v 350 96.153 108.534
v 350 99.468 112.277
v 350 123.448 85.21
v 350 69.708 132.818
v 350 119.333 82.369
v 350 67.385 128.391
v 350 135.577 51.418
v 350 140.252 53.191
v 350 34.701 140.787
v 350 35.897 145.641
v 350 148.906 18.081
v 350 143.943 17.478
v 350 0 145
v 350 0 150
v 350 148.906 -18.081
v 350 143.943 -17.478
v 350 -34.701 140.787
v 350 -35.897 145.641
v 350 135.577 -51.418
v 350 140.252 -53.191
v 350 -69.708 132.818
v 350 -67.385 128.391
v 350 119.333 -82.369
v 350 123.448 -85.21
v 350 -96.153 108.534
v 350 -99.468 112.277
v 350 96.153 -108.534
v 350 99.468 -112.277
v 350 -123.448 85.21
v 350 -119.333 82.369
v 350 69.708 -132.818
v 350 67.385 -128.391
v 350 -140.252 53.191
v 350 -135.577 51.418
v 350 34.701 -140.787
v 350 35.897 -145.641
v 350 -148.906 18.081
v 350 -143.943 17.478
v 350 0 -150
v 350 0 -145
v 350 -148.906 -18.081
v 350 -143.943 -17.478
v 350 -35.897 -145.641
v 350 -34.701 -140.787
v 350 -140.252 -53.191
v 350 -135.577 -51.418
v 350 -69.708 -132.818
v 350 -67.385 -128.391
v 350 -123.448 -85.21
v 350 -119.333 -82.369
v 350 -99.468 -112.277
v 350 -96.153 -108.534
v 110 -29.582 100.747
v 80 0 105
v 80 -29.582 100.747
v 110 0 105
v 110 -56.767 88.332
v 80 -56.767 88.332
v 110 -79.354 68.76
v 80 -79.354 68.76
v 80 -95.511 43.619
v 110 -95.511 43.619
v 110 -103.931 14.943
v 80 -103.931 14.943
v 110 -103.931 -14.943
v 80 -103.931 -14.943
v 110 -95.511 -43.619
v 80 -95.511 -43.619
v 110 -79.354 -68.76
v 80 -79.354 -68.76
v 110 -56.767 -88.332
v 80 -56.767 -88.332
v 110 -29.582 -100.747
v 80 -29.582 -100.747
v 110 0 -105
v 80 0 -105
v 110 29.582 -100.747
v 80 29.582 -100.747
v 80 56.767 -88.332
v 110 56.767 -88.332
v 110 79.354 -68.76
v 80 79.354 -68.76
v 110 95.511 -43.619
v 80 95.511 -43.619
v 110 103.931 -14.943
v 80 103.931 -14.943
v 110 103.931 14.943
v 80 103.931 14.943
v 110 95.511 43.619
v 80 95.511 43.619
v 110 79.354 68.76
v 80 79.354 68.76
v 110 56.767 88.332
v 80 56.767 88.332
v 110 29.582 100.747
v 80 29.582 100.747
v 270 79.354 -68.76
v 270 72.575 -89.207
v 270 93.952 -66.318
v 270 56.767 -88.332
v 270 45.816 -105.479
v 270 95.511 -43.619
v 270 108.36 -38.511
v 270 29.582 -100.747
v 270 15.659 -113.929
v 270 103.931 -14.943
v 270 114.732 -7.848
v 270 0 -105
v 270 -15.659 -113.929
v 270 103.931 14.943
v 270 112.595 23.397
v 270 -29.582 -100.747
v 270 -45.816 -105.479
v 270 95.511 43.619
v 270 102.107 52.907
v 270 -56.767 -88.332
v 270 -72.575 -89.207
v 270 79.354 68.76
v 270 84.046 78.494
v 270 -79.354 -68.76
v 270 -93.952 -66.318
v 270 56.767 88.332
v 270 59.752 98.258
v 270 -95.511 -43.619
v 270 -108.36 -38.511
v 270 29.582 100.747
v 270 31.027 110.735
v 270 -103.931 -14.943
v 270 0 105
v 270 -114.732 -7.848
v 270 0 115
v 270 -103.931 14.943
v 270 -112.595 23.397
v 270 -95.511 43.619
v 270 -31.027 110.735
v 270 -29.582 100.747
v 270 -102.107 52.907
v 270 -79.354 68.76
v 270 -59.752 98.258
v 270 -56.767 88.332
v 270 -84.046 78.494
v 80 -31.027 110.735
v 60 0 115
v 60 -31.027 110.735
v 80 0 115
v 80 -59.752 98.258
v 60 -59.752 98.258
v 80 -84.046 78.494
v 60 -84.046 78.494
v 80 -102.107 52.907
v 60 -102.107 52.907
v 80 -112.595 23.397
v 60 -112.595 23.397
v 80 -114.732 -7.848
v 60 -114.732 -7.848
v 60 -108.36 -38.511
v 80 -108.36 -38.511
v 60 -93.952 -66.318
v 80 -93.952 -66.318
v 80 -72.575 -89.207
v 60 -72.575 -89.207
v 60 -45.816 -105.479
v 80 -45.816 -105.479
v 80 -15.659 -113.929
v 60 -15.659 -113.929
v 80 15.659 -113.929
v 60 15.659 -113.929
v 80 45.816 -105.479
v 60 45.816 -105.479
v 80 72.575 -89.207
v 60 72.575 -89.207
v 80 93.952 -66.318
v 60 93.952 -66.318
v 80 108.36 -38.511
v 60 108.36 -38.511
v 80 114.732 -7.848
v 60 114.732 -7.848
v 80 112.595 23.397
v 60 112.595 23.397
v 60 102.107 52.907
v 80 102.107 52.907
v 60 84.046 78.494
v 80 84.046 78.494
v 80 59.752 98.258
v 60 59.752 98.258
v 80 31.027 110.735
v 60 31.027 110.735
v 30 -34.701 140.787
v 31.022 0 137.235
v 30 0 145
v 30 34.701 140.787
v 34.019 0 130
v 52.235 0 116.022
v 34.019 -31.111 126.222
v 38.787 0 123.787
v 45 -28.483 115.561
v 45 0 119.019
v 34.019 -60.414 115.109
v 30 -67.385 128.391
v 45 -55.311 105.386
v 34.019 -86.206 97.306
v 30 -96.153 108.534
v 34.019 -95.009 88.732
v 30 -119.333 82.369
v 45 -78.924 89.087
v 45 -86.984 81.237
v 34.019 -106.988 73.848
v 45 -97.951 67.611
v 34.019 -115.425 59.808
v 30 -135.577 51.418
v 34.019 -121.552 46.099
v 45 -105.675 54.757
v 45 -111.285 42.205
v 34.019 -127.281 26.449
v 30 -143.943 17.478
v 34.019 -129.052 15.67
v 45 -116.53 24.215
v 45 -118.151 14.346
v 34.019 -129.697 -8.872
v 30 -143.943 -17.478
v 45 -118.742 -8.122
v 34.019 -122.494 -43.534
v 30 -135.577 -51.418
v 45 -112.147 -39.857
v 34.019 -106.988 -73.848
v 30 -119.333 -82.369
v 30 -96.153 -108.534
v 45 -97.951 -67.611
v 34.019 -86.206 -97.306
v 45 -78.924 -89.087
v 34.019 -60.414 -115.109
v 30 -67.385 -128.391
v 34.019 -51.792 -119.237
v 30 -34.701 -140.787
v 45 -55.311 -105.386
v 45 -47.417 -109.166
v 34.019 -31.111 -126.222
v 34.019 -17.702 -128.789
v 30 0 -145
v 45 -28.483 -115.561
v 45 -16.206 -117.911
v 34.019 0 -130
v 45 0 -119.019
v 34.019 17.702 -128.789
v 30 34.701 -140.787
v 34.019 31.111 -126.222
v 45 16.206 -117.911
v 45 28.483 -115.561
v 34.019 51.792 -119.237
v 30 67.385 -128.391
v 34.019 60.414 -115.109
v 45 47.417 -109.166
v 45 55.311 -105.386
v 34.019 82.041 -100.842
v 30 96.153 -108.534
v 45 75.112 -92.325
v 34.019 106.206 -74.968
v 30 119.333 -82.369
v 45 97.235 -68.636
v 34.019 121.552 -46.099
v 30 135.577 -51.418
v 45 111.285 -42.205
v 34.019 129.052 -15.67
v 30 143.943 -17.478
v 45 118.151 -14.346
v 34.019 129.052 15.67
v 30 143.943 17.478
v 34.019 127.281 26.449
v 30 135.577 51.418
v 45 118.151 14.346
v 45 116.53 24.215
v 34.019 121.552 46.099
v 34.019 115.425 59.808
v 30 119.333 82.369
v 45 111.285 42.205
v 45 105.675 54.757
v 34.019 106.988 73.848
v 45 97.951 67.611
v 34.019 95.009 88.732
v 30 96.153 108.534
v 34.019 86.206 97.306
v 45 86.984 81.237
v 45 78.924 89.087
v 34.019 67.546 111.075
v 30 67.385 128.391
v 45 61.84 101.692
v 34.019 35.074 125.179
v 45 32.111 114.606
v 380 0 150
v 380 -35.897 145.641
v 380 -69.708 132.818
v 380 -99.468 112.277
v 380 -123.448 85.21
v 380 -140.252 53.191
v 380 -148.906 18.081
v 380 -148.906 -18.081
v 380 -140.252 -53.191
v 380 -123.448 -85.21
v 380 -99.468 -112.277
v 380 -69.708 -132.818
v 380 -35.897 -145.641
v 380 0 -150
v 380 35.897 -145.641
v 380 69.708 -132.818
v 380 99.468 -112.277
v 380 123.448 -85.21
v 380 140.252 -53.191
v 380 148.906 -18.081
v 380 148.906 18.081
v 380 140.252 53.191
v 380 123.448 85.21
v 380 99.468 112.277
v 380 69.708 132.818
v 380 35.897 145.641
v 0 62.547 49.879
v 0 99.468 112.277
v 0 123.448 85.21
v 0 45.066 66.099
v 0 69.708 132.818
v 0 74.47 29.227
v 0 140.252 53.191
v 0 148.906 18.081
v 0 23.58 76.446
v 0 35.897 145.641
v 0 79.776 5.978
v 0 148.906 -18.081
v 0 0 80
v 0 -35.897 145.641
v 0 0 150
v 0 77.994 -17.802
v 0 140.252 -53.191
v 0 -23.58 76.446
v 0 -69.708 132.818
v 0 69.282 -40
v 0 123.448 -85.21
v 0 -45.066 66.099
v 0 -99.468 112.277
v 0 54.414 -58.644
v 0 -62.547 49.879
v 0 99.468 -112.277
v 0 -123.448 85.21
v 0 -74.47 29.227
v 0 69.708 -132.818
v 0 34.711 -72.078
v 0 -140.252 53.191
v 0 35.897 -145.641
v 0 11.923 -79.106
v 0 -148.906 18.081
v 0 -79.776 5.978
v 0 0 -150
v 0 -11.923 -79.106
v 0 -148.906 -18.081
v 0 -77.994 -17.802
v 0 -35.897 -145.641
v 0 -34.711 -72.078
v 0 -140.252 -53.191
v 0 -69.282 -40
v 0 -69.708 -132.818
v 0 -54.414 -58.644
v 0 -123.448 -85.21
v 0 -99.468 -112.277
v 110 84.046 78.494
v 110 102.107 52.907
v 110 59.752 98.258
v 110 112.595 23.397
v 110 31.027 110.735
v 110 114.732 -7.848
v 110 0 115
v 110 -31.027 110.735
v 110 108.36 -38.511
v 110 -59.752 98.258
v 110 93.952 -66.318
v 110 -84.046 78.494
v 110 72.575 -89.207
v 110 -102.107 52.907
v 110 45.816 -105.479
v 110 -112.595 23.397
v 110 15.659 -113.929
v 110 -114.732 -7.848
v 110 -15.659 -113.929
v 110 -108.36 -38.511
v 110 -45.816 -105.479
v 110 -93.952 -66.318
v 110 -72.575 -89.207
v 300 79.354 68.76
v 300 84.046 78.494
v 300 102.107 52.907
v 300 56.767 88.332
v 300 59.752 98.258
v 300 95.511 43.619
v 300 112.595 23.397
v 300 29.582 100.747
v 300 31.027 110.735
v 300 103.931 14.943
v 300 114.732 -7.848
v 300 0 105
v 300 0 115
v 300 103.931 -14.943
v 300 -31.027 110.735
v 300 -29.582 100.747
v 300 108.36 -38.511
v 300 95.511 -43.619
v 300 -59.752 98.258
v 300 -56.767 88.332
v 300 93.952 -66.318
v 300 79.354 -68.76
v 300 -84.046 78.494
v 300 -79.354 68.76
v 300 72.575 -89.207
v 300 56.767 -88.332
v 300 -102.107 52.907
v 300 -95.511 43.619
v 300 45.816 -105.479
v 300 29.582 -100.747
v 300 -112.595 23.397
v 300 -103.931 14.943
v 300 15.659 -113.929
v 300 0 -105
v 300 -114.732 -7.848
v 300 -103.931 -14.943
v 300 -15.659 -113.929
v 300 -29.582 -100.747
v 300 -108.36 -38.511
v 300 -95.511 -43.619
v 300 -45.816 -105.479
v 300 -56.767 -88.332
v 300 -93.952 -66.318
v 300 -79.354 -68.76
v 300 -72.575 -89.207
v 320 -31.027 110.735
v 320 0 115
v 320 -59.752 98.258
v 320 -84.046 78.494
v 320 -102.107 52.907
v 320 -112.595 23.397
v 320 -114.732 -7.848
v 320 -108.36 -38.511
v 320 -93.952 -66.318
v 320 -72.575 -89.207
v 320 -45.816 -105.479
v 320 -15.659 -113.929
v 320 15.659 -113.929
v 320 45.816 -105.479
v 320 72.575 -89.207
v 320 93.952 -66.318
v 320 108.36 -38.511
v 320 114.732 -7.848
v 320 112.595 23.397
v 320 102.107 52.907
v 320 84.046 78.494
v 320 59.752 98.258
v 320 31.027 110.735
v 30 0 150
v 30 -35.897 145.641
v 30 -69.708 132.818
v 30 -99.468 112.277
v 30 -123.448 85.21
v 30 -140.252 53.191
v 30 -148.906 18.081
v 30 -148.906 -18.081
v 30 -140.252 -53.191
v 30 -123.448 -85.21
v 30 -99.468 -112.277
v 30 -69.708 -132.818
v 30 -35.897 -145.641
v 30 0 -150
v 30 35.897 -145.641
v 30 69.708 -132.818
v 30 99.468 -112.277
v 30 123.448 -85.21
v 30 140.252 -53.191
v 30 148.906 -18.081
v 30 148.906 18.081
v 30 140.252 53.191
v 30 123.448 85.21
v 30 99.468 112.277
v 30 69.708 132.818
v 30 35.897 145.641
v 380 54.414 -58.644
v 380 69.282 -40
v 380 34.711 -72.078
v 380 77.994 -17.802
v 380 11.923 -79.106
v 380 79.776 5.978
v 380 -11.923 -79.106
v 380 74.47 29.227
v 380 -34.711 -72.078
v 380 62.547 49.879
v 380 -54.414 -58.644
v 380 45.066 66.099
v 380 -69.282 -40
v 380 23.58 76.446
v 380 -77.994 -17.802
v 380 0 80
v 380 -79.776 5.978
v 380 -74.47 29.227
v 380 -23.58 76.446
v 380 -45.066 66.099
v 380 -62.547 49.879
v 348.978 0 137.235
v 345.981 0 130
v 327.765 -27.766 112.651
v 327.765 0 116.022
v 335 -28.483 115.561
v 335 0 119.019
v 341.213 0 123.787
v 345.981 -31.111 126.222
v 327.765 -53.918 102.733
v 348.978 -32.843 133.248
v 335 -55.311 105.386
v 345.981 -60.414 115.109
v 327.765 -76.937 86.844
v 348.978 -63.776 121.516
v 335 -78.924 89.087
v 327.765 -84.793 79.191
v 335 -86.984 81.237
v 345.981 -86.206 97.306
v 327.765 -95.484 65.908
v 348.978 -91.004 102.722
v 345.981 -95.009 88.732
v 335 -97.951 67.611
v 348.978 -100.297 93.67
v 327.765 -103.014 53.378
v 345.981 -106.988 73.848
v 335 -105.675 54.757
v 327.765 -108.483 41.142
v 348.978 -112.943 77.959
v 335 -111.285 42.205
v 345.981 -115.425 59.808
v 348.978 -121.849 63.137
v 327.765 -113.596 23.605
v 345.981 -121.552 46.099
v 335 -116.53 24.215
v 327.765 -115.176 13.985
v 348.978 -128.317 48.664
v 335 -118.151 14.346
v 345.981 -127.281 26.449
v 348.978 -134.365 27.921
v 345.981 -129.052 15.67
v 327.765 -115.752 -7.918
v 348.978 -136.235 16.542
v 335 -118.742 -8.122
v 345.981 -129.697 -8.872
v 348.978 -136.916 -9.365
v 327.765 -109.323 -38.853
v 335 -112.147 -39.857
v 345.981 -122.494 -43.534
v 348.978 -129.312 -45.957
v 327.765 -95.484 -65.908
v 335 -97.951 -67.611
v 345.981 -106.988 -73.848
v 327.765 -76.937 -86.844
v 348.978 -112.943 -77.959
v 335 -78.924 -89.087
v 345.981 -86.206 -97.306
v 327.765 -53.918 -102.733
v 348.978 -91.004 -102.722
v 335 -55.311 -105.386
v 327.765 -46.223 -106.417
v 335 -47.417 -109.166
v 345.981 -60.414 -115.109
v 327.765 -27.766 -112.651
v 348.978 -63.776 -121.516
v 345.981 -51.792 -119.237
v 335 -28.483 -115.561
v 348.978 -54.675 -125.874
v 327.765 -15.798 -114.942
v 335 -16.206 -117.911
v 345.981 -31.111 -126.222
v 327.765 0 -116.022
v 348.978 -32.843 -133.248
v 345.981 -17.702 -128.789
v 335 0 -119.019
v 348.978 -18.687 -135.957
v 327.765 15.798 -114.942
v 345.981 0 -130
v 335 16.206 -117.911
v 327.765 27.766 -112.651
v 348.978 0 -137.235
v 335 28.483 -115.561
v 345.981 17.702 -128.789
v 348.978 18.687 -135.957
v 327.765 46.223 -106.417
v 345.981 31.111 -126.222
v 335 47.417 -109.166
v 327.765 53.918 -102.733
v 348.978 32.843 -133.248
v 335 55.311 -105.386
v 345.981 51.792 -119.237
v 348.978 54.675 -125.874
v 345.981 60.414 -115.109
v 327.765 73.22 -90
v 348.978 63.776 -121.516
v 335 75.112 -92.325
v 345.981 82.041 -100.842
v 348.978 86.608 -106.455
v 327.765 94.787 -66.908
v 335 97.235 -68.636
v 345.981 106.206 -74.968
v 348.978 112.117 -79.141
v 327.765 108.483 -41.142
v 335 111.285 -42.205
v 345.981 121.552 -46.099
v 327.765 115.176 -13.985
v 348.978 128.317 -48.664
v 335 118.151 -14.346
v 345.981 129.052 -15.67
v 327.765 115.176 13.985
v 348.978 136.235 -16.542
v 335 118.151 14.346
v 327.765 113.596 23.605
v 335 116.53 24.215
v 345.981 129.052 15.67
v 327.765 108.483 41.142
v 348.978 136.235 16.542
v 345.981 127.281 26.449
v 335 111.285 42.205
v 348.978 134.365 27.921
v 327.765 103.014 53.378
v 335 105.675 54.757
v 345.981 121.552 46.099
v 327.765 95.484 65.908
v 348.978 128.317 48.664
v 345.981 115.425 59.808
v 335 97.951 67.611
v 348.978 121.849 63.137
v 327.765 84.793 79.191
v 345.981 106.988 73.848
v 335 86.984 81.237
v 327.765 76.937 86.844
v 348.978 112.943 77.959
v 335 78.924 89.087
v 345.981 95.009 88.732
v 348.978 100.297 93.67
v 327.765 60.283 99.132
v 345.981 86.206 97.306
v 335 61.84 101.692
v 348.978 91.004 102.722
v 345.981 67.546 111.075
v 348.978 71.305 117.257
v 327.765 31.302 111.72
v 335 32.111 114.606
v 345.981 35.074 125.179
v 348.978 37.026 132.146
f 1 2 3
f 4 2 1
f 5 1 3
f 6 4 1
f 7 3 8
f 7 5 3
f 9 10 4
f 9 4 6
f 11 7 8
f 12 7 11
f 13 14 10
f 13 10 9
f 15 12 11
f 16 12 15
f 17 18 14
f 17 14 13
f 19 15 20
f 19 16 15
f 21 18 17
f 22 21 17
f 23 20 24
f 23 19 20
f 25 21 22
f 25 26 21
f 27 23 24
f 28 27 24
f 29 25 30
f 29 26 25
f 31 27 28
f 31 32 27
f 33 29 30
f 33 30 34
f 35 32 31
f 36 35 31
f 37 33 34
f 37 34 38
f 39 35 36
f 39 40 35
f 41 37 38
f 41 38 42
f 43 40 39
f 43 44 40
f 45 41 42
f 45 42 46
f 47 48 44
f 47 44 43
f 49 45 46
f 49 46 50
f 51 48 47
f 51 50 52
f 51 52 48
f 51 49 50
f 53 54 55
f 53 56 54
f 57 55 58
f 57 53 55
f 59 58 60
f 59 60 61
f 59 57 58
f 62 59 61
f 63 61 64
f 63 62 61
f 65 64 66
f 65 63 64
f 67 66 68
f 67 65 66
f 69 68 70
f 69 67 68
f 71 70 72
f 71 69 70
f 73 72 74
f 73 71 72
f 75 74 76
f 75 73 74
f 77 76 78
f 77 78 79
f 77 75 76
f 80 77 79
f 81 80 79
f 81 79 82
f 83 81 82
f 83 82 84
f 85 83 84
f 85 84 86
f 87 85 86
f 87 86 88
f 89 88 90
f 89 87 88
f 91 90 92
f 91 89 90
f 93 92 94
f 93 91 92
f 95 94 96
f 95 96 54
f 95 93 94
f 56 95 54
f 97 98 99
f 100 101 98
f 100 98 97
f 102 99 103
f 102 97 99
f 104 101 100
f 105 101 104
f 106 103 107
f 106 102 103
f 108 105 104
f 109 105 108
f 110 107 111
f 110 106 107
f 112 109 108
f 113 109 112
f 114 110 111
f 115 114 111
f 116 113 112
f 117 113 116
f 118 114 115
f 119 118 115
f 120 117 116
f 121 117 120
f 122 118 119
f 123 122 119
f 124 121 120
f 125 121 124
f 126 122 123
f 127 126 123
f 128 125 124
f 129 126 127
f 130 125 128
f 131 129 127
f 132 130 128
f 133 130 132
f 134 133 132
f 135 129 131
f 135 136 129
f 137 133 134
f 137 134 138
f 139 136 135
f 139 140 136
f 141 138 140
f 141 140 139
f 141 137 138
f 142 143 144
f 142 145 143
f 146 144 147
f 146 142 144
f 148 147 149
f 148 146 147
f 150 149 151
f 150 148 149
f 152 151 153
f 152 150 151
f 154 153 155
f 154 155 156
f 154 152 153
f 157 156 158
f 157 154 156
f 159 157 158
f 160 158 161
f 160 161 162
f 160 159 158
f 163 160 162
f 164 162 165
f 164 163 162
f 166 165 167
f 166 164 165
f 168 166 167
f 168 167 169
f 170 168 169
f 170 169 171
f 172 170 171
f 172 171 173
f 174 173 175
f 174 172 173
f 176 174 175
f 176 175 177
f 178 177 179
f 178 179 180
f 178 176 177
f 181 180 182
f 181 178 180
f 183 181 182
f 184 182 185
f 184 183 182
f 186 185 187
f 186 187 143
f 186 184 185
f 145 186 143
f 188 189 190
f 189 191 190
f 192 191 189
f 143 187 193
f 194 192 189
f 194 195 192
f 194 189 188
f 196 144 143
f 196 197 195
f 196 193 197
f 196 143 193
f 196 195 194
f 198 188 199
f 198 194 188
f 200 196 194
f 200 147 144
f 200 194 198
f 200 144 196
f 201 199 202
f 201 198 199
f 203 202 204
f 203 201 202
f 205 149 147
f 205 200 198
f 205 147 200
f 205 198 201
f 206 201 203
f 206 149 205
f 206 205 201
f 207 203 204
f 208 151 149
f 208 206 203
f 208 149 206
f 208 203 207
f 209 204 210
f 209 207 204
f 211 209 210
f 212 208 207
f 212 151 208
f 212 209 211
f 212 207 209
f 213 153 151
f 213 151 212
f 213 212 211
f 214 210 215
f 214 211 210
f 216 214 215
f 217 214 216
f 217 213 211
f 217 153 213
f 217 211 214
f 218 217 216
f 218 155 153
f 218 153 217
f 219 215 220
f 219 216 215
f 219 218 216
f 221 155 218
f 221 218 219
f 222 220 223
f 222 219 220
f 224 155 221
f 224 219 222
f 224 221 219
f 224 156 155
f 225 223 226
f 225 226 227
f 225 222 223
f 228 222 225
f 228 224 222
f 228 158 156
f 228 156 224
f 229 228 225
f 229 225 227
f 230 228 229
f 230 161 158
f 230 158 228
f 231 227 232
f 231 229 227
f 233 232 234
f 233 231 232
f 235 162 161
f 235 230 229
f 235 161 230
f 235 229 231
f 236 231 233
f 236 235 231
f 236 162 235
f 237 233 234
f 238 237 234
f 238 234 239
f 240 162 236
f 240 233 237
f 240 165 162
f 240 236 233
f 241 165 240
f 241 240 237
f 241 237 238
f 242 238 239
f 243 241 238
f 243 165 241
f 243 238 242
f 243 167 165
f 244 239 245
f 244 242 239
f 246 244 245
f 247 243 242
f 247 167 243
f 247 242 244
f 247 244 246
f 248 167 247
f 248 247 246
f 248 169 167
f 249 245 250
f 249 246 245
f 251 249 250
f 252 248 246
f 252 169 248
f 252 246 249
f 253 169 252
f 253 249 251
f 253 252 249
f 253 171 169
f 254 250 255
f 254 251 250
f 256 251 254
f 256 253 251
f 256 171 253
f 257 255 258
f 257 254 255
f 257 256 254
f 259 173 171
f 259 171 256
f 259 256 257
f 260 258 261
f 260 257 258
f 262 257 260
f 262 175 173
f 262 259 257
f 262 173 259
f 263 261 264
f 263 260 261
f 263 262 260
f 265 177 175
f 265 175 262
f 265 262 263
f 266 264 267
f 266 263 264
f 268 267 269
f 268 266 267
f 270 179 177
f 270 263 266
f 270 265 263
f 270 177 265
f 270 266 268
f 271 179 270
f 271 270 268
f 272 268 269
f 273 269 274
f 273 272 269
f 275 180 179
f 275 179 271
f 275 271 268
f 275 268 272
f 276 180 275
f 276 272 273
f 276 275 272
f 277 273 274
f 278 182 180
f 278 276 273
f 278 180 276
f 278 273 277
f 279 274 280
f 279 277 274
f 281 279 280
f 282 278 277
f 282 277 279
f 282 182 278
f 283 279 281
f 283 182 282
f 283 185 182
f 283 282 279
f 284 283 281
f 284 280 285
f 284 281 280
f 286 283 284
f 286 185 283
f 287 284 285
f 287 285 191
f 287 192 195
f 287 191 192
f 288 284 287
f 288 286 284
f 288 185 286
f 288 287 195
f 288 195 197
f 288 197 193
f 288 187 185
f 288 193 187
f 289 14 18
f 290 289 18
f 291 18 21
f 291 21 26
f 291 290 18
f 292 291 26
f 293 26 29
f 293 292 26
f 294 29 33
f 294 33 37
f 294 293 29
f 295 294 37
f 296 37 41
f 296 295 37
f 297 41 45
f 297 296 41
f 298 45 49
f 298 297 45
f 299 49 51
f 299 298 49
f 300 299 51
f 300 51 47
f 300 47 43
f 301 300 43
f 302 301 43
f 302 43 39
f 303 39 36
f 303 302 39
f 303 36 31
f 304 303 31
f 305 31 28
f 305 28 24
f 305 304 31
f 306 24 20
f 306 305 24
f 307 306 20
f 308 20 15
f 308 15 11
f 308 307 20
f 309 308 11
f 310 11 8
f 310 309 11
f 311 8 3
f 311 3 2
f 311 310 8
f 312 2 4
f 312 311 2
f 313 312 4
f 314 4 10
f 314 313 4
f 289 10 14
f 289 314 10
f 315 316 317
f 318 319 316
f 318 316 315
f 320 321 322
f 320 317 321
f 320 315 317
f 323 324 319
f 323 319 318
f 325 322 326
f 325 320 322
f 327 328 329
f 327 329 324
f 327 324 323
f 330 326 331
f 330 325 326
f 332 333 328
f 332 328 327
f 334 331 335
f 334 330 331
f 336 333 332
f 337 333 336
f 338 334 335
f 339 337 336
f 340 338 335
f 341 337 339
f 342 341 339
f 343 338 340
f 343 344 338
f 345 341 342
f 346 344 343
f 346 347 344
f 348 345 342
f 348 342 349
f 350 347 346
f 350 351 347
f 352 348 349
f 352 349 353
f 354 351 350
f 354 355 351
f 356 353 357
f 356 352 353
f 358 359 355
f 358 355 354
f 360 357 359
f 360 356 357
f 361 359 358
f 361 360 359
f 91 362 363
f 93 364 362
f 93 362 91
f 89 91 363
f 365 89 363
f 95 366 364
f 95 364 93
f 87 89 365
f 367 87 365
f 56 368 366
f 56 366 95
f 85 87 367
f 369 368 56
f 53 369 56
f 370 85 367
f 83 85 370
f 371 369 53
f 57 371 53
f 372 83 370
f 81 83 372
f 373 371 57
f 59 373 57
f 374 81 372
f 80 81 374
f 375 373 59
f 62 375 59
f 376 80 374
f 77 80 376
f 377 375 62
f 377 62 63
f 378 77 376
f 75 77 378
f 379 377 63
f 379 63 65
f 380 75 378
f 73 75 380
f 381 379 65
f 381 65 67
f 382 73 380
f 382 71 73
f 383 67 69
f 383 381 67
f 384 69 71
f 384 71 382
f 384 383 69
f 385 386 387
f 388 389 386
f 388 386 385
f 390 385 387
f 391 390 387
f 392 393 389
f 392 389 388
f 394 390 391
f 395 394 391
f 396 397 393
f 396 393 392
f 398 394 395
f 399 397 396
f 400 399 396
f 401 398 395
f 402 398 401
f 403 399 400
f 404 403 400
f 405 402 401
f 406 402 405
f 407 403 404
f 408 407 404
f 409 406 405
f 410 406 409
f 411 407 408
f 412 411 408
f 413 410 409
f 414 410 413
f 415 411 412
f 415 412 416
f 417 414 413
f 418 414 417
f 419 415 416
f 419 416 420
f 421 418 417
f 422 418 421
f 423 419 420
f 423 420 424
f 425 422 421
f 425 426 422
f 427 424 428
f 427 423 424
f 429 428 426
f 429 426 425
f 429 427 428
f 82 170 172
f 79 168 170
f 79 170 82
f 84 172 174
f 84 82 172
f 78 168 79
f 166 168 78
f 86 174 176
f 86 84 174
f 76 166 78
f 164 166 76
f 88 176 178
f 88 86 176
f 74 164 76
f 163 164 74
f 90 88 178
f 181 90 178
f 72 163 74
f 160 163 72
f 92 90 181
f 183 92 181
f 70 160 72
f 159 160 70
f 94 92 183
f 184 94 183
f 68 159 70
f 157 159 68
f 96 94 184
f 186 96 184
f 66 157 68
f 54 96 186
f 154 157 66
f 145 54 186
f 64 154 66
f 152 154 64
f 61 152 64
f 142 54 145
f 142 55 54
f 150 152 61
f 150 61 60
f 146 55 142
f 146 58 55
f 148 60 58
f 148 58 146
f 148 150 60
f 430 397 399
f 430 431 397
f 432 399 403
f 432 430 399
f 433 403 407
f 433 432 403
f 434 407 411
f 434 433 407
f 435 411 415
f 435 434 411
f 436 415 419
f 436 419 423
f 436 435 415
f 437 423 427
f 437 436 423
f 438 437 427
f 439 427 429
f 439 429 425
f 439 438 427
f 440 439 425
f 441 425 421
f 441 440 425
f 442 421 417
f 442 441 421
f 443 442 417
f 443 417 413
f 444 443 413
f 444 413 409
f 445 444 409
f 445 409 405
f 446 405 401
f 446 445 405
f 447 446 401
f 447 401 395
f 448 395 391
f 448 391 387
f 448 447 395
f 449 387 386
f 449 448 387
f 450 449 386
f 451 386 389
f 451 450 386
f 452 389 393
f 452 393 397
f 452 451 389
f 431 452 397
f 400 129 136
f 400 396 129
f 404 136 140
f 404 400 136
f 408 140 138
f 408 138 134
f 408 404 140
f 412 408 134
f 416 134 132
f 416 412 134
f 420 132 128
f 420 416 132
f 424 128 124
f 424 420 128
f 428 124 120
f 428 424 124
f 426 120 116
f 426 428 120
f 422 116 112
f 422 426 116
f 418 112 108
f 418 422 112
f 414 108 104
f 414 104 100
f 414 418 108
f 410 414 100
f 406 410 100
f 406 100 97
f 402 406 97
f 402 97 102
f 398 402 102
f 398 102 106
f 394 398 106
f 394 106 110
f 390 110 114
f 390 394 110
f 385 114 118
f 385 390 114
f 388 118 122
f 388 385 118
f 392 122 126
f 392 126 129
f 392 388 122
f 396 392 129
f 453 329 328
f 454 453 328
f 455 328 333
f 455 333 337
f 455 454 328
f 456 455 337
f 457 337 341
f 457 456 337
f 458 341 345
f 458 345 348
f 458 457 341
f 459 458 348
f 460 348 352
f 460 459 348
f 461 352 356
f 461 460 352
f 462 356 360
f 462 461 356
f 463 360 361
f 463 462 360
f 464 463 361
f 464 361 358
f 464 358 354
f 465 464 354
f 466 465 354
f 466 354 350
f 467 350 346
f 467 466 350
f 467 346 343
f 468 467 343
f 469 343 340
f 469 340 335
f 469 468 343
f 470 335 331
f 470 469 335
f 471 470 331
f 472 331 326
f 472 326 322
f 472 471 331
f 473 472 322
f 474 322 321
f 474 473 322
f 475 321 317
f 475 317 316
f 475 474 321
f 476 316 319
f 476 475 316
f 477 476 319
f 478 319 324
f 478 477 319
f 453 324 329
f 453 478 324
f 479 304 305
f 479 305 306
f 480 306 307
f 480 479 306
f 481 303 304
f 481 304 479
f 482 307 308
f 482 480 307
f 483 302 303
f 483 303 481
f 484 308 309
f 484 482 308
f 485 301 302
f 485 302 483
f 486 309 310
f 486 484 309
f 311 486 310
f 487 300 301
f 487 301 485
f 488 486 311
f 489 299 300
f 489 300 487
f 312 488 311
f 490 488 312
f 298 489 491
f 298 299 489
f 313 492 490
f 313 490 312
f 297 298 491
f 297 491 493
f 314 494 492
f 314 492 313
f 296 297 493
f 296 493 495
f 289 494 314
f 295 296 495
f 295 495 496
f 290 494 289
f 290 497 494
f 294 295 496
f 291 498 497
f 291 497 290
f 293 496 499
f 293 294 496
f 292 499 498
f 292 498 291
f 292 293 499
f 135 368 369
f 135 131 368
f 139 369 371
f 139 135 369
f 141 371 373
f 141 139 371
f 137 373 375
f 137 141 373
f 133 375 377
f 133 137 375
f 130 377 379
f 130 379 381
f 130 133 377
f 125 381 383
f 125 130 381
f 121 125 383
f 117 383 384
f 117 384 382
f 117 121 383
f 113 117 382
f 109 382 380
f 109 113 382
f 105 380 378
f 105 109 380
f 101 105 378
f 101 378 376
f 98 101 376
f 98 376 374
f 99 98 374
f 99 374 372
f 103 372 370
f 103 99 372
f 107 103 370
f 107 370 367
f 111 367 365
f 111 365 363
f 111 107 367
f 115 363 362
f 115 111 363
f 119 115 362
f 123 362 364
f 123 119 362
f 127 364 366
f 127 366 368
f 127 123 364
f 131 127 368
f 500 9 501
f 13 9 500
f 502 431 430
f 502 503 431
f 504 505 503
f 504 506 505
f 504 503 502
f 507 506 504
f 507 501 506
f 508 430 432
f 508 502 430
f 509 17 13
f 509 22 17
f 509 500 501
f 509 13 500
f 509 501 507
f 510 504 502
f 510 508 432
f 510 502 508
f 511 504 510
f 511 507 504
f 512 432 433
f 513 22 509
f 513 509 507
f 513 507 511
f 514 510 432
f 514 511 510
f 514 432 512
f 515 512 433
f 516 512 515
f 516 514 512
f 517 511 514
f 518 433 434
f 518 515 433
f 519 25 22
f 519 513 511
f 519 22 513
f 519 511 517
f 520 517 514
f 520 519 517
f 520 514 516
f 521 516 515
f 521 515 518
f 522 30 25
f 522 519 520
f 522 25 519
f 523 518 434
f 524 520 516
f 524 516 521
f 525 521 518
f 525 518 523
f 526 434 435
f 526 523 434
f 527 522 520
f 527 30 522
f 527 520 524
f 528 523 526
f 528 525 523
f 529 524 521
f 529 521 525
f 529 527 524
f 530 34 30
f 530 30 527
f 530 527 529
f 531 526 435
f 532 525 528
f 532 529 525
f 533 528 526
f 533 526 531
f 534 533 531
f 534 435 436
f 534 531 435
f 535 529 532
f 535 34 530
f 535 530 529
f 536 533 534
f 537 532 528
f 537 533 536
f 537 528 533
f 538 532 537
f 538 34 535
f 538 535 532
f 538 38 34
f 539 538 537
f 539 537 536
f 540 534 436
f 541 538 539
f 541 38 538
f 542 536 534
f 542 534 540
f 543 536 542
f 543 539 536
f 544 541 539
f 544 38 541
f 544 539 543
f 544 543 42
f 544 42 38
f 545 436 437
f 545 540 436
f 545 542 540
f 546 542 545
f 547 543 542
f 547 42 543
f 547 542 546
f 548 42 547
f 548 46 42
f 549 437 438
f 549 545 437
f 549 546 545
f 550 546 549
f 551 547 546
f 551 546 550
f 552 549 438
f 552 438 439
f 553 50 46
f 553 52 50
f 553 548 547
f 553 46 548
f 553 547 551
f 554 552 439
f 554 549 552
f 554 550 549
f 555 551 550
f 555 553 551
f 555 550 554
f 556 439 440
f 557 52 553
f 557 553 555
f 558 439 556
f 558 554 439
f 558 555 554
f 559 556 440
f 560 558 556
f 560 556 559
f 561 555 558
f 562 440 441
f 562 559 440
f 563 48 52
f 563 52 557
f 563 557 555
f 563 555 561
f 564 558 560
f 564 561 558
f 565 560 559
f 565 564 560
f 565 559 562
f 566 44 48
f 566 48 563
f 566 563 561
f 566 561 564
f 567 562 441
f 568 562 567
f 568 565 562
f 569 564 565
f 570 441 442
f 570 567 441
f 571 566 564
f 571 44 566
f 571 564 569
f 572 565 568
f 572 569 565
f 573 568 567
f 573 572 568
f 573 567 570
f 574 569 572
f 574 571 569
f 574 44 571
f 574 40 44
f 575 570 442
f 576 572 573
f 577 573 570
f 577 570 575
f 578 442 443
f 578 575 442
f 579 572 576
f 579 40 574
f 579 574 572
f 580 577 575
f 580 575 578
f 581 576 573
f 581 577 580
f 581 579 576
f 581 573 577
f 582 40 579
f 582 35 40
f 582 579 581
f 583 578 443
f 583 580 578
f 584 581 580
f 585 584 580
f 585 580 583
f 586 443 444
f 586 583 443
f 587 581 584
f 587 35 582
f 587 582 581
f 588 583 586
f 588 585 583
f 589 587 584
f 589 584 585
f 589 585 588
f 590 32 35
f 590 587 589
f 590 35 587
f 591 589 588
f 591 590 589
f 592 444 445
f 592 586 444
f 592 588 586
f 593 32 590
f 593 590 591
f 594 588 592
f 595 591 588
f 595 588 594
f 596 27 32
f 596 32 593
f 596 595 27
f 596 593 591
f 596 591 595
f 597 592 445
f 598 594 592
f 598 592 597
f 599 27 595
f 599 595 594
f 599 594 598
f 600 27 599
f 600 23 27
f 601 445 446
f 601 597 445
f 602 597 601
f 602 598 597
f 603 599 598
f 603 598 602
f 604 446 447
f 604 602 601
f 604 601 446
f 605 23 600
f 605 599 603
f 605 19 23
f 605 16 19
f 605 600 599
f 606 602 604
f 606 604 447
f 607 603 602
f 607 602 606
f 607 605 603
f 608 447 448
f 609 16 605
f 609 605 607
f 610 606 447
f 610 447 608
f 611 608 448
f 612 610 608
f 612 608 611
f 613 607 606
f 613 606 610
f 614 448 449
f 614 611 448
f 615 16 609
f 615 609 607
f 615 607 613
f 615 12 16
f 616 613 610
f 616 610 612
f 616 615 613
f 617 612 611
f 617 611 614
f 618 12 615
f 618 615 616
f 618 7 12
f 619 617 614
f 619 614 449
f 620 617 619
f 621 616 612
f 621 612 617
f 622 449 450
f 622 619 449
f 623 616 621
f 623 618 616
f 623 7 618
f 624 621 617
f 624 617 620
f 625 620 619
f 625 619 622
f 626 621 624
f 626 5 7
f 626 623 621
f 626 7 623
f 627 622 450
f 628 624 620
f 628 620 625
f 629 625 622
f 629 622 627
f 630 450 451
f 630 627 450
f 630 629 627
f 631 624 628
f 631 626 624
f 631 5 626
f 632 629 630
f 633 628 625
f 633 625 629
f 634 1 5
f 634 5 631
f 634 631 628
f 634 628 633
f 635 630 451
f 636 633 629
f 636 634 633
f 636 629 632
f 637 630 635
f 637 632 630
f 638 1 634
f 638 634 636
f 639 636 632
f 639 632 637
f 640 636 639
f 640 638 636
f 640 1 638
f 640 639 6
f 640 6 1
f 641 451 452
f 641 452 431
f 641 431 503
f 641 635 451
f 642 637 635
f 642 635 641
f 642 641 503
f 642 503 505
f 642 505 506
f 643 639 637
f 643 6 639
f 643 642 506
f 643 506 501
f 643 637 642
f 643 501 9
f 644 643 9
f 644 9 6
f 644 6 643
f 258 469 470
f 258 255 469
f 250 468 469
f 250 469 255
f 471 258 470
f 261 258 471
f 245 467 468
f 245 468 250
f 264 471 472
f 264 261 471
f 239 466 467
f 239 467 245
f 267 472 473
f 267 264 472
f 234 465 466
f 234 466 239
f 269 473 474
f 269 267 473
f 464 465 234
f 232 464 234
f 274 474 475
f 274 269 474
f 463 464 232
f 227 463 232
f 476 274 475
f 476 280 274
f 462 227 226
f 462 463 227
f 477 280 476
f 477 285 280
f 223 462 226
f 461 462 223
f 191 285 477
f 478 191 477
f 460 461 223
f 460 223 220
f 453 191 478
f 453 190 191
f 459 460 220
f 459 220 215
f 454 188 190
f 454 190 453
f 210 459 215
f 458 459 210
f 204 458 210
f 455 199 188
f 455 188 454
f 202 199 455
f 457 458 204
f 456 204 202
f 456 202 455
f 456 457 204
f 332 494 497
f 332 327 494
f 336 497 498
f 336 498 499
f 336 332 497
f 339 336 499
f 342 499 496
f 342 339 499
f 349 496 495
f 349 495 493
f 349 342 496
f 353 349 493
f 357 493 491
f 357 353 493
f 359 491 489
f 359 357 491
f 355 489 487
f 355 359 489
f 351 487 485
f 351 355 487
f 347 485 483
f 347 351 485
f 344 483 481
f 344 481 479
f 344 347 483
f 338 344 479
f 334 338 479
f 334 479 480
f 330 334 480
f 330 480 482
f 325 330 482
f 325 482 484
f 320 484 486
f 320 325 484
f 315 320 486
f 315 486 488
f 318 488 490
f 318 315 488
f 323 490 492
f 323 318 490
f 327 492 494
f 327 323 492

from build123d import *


with BuildPart() as part:
    # Esquisse2 → Révolution1 (revolve)
    with BuildSketch(Plane.XY, mode=Mode.PRIVATE) as r_volution1_sk:
        with BuildLine():
            Line((380, 150), (380, 80))
            Line((380, 80), (0, 80))
            Line((0, 80), (0, 150))
            Line((0, 150), (30, 150))
            Line((30, 150), (30, 145))
            ThreePointArc((30, 145), (38.786796564, 123.786796564), (60, 115))
            Line((60, 115), (80, 115))
            Line((80, 115), (80, 105))
            Line((80, 105), (110, 105))
            Line((110, 105), (110, 115))
            Line((110, 115), (270, 115))
            Line((270, 115), (270, 105))
            Line((270, 105), (300, 105))
            Line((300, 105), (300, 115))
            Line((300, 115), (320, 115))
            ThreePointArc((320, 115), (341.213203436, 123.786796564), (350, 145))
            Line((350, 145), (350, 150))
            Line((350, 150), (380, 150))
        make_face()
    revolve(r_volution1_sk.sketch.rotate(Axis((0, 0, 0), (1, 0, 0)), 90), axis=Axis((0, 0, 0), (1, 0, 0)))


solid = part.part
